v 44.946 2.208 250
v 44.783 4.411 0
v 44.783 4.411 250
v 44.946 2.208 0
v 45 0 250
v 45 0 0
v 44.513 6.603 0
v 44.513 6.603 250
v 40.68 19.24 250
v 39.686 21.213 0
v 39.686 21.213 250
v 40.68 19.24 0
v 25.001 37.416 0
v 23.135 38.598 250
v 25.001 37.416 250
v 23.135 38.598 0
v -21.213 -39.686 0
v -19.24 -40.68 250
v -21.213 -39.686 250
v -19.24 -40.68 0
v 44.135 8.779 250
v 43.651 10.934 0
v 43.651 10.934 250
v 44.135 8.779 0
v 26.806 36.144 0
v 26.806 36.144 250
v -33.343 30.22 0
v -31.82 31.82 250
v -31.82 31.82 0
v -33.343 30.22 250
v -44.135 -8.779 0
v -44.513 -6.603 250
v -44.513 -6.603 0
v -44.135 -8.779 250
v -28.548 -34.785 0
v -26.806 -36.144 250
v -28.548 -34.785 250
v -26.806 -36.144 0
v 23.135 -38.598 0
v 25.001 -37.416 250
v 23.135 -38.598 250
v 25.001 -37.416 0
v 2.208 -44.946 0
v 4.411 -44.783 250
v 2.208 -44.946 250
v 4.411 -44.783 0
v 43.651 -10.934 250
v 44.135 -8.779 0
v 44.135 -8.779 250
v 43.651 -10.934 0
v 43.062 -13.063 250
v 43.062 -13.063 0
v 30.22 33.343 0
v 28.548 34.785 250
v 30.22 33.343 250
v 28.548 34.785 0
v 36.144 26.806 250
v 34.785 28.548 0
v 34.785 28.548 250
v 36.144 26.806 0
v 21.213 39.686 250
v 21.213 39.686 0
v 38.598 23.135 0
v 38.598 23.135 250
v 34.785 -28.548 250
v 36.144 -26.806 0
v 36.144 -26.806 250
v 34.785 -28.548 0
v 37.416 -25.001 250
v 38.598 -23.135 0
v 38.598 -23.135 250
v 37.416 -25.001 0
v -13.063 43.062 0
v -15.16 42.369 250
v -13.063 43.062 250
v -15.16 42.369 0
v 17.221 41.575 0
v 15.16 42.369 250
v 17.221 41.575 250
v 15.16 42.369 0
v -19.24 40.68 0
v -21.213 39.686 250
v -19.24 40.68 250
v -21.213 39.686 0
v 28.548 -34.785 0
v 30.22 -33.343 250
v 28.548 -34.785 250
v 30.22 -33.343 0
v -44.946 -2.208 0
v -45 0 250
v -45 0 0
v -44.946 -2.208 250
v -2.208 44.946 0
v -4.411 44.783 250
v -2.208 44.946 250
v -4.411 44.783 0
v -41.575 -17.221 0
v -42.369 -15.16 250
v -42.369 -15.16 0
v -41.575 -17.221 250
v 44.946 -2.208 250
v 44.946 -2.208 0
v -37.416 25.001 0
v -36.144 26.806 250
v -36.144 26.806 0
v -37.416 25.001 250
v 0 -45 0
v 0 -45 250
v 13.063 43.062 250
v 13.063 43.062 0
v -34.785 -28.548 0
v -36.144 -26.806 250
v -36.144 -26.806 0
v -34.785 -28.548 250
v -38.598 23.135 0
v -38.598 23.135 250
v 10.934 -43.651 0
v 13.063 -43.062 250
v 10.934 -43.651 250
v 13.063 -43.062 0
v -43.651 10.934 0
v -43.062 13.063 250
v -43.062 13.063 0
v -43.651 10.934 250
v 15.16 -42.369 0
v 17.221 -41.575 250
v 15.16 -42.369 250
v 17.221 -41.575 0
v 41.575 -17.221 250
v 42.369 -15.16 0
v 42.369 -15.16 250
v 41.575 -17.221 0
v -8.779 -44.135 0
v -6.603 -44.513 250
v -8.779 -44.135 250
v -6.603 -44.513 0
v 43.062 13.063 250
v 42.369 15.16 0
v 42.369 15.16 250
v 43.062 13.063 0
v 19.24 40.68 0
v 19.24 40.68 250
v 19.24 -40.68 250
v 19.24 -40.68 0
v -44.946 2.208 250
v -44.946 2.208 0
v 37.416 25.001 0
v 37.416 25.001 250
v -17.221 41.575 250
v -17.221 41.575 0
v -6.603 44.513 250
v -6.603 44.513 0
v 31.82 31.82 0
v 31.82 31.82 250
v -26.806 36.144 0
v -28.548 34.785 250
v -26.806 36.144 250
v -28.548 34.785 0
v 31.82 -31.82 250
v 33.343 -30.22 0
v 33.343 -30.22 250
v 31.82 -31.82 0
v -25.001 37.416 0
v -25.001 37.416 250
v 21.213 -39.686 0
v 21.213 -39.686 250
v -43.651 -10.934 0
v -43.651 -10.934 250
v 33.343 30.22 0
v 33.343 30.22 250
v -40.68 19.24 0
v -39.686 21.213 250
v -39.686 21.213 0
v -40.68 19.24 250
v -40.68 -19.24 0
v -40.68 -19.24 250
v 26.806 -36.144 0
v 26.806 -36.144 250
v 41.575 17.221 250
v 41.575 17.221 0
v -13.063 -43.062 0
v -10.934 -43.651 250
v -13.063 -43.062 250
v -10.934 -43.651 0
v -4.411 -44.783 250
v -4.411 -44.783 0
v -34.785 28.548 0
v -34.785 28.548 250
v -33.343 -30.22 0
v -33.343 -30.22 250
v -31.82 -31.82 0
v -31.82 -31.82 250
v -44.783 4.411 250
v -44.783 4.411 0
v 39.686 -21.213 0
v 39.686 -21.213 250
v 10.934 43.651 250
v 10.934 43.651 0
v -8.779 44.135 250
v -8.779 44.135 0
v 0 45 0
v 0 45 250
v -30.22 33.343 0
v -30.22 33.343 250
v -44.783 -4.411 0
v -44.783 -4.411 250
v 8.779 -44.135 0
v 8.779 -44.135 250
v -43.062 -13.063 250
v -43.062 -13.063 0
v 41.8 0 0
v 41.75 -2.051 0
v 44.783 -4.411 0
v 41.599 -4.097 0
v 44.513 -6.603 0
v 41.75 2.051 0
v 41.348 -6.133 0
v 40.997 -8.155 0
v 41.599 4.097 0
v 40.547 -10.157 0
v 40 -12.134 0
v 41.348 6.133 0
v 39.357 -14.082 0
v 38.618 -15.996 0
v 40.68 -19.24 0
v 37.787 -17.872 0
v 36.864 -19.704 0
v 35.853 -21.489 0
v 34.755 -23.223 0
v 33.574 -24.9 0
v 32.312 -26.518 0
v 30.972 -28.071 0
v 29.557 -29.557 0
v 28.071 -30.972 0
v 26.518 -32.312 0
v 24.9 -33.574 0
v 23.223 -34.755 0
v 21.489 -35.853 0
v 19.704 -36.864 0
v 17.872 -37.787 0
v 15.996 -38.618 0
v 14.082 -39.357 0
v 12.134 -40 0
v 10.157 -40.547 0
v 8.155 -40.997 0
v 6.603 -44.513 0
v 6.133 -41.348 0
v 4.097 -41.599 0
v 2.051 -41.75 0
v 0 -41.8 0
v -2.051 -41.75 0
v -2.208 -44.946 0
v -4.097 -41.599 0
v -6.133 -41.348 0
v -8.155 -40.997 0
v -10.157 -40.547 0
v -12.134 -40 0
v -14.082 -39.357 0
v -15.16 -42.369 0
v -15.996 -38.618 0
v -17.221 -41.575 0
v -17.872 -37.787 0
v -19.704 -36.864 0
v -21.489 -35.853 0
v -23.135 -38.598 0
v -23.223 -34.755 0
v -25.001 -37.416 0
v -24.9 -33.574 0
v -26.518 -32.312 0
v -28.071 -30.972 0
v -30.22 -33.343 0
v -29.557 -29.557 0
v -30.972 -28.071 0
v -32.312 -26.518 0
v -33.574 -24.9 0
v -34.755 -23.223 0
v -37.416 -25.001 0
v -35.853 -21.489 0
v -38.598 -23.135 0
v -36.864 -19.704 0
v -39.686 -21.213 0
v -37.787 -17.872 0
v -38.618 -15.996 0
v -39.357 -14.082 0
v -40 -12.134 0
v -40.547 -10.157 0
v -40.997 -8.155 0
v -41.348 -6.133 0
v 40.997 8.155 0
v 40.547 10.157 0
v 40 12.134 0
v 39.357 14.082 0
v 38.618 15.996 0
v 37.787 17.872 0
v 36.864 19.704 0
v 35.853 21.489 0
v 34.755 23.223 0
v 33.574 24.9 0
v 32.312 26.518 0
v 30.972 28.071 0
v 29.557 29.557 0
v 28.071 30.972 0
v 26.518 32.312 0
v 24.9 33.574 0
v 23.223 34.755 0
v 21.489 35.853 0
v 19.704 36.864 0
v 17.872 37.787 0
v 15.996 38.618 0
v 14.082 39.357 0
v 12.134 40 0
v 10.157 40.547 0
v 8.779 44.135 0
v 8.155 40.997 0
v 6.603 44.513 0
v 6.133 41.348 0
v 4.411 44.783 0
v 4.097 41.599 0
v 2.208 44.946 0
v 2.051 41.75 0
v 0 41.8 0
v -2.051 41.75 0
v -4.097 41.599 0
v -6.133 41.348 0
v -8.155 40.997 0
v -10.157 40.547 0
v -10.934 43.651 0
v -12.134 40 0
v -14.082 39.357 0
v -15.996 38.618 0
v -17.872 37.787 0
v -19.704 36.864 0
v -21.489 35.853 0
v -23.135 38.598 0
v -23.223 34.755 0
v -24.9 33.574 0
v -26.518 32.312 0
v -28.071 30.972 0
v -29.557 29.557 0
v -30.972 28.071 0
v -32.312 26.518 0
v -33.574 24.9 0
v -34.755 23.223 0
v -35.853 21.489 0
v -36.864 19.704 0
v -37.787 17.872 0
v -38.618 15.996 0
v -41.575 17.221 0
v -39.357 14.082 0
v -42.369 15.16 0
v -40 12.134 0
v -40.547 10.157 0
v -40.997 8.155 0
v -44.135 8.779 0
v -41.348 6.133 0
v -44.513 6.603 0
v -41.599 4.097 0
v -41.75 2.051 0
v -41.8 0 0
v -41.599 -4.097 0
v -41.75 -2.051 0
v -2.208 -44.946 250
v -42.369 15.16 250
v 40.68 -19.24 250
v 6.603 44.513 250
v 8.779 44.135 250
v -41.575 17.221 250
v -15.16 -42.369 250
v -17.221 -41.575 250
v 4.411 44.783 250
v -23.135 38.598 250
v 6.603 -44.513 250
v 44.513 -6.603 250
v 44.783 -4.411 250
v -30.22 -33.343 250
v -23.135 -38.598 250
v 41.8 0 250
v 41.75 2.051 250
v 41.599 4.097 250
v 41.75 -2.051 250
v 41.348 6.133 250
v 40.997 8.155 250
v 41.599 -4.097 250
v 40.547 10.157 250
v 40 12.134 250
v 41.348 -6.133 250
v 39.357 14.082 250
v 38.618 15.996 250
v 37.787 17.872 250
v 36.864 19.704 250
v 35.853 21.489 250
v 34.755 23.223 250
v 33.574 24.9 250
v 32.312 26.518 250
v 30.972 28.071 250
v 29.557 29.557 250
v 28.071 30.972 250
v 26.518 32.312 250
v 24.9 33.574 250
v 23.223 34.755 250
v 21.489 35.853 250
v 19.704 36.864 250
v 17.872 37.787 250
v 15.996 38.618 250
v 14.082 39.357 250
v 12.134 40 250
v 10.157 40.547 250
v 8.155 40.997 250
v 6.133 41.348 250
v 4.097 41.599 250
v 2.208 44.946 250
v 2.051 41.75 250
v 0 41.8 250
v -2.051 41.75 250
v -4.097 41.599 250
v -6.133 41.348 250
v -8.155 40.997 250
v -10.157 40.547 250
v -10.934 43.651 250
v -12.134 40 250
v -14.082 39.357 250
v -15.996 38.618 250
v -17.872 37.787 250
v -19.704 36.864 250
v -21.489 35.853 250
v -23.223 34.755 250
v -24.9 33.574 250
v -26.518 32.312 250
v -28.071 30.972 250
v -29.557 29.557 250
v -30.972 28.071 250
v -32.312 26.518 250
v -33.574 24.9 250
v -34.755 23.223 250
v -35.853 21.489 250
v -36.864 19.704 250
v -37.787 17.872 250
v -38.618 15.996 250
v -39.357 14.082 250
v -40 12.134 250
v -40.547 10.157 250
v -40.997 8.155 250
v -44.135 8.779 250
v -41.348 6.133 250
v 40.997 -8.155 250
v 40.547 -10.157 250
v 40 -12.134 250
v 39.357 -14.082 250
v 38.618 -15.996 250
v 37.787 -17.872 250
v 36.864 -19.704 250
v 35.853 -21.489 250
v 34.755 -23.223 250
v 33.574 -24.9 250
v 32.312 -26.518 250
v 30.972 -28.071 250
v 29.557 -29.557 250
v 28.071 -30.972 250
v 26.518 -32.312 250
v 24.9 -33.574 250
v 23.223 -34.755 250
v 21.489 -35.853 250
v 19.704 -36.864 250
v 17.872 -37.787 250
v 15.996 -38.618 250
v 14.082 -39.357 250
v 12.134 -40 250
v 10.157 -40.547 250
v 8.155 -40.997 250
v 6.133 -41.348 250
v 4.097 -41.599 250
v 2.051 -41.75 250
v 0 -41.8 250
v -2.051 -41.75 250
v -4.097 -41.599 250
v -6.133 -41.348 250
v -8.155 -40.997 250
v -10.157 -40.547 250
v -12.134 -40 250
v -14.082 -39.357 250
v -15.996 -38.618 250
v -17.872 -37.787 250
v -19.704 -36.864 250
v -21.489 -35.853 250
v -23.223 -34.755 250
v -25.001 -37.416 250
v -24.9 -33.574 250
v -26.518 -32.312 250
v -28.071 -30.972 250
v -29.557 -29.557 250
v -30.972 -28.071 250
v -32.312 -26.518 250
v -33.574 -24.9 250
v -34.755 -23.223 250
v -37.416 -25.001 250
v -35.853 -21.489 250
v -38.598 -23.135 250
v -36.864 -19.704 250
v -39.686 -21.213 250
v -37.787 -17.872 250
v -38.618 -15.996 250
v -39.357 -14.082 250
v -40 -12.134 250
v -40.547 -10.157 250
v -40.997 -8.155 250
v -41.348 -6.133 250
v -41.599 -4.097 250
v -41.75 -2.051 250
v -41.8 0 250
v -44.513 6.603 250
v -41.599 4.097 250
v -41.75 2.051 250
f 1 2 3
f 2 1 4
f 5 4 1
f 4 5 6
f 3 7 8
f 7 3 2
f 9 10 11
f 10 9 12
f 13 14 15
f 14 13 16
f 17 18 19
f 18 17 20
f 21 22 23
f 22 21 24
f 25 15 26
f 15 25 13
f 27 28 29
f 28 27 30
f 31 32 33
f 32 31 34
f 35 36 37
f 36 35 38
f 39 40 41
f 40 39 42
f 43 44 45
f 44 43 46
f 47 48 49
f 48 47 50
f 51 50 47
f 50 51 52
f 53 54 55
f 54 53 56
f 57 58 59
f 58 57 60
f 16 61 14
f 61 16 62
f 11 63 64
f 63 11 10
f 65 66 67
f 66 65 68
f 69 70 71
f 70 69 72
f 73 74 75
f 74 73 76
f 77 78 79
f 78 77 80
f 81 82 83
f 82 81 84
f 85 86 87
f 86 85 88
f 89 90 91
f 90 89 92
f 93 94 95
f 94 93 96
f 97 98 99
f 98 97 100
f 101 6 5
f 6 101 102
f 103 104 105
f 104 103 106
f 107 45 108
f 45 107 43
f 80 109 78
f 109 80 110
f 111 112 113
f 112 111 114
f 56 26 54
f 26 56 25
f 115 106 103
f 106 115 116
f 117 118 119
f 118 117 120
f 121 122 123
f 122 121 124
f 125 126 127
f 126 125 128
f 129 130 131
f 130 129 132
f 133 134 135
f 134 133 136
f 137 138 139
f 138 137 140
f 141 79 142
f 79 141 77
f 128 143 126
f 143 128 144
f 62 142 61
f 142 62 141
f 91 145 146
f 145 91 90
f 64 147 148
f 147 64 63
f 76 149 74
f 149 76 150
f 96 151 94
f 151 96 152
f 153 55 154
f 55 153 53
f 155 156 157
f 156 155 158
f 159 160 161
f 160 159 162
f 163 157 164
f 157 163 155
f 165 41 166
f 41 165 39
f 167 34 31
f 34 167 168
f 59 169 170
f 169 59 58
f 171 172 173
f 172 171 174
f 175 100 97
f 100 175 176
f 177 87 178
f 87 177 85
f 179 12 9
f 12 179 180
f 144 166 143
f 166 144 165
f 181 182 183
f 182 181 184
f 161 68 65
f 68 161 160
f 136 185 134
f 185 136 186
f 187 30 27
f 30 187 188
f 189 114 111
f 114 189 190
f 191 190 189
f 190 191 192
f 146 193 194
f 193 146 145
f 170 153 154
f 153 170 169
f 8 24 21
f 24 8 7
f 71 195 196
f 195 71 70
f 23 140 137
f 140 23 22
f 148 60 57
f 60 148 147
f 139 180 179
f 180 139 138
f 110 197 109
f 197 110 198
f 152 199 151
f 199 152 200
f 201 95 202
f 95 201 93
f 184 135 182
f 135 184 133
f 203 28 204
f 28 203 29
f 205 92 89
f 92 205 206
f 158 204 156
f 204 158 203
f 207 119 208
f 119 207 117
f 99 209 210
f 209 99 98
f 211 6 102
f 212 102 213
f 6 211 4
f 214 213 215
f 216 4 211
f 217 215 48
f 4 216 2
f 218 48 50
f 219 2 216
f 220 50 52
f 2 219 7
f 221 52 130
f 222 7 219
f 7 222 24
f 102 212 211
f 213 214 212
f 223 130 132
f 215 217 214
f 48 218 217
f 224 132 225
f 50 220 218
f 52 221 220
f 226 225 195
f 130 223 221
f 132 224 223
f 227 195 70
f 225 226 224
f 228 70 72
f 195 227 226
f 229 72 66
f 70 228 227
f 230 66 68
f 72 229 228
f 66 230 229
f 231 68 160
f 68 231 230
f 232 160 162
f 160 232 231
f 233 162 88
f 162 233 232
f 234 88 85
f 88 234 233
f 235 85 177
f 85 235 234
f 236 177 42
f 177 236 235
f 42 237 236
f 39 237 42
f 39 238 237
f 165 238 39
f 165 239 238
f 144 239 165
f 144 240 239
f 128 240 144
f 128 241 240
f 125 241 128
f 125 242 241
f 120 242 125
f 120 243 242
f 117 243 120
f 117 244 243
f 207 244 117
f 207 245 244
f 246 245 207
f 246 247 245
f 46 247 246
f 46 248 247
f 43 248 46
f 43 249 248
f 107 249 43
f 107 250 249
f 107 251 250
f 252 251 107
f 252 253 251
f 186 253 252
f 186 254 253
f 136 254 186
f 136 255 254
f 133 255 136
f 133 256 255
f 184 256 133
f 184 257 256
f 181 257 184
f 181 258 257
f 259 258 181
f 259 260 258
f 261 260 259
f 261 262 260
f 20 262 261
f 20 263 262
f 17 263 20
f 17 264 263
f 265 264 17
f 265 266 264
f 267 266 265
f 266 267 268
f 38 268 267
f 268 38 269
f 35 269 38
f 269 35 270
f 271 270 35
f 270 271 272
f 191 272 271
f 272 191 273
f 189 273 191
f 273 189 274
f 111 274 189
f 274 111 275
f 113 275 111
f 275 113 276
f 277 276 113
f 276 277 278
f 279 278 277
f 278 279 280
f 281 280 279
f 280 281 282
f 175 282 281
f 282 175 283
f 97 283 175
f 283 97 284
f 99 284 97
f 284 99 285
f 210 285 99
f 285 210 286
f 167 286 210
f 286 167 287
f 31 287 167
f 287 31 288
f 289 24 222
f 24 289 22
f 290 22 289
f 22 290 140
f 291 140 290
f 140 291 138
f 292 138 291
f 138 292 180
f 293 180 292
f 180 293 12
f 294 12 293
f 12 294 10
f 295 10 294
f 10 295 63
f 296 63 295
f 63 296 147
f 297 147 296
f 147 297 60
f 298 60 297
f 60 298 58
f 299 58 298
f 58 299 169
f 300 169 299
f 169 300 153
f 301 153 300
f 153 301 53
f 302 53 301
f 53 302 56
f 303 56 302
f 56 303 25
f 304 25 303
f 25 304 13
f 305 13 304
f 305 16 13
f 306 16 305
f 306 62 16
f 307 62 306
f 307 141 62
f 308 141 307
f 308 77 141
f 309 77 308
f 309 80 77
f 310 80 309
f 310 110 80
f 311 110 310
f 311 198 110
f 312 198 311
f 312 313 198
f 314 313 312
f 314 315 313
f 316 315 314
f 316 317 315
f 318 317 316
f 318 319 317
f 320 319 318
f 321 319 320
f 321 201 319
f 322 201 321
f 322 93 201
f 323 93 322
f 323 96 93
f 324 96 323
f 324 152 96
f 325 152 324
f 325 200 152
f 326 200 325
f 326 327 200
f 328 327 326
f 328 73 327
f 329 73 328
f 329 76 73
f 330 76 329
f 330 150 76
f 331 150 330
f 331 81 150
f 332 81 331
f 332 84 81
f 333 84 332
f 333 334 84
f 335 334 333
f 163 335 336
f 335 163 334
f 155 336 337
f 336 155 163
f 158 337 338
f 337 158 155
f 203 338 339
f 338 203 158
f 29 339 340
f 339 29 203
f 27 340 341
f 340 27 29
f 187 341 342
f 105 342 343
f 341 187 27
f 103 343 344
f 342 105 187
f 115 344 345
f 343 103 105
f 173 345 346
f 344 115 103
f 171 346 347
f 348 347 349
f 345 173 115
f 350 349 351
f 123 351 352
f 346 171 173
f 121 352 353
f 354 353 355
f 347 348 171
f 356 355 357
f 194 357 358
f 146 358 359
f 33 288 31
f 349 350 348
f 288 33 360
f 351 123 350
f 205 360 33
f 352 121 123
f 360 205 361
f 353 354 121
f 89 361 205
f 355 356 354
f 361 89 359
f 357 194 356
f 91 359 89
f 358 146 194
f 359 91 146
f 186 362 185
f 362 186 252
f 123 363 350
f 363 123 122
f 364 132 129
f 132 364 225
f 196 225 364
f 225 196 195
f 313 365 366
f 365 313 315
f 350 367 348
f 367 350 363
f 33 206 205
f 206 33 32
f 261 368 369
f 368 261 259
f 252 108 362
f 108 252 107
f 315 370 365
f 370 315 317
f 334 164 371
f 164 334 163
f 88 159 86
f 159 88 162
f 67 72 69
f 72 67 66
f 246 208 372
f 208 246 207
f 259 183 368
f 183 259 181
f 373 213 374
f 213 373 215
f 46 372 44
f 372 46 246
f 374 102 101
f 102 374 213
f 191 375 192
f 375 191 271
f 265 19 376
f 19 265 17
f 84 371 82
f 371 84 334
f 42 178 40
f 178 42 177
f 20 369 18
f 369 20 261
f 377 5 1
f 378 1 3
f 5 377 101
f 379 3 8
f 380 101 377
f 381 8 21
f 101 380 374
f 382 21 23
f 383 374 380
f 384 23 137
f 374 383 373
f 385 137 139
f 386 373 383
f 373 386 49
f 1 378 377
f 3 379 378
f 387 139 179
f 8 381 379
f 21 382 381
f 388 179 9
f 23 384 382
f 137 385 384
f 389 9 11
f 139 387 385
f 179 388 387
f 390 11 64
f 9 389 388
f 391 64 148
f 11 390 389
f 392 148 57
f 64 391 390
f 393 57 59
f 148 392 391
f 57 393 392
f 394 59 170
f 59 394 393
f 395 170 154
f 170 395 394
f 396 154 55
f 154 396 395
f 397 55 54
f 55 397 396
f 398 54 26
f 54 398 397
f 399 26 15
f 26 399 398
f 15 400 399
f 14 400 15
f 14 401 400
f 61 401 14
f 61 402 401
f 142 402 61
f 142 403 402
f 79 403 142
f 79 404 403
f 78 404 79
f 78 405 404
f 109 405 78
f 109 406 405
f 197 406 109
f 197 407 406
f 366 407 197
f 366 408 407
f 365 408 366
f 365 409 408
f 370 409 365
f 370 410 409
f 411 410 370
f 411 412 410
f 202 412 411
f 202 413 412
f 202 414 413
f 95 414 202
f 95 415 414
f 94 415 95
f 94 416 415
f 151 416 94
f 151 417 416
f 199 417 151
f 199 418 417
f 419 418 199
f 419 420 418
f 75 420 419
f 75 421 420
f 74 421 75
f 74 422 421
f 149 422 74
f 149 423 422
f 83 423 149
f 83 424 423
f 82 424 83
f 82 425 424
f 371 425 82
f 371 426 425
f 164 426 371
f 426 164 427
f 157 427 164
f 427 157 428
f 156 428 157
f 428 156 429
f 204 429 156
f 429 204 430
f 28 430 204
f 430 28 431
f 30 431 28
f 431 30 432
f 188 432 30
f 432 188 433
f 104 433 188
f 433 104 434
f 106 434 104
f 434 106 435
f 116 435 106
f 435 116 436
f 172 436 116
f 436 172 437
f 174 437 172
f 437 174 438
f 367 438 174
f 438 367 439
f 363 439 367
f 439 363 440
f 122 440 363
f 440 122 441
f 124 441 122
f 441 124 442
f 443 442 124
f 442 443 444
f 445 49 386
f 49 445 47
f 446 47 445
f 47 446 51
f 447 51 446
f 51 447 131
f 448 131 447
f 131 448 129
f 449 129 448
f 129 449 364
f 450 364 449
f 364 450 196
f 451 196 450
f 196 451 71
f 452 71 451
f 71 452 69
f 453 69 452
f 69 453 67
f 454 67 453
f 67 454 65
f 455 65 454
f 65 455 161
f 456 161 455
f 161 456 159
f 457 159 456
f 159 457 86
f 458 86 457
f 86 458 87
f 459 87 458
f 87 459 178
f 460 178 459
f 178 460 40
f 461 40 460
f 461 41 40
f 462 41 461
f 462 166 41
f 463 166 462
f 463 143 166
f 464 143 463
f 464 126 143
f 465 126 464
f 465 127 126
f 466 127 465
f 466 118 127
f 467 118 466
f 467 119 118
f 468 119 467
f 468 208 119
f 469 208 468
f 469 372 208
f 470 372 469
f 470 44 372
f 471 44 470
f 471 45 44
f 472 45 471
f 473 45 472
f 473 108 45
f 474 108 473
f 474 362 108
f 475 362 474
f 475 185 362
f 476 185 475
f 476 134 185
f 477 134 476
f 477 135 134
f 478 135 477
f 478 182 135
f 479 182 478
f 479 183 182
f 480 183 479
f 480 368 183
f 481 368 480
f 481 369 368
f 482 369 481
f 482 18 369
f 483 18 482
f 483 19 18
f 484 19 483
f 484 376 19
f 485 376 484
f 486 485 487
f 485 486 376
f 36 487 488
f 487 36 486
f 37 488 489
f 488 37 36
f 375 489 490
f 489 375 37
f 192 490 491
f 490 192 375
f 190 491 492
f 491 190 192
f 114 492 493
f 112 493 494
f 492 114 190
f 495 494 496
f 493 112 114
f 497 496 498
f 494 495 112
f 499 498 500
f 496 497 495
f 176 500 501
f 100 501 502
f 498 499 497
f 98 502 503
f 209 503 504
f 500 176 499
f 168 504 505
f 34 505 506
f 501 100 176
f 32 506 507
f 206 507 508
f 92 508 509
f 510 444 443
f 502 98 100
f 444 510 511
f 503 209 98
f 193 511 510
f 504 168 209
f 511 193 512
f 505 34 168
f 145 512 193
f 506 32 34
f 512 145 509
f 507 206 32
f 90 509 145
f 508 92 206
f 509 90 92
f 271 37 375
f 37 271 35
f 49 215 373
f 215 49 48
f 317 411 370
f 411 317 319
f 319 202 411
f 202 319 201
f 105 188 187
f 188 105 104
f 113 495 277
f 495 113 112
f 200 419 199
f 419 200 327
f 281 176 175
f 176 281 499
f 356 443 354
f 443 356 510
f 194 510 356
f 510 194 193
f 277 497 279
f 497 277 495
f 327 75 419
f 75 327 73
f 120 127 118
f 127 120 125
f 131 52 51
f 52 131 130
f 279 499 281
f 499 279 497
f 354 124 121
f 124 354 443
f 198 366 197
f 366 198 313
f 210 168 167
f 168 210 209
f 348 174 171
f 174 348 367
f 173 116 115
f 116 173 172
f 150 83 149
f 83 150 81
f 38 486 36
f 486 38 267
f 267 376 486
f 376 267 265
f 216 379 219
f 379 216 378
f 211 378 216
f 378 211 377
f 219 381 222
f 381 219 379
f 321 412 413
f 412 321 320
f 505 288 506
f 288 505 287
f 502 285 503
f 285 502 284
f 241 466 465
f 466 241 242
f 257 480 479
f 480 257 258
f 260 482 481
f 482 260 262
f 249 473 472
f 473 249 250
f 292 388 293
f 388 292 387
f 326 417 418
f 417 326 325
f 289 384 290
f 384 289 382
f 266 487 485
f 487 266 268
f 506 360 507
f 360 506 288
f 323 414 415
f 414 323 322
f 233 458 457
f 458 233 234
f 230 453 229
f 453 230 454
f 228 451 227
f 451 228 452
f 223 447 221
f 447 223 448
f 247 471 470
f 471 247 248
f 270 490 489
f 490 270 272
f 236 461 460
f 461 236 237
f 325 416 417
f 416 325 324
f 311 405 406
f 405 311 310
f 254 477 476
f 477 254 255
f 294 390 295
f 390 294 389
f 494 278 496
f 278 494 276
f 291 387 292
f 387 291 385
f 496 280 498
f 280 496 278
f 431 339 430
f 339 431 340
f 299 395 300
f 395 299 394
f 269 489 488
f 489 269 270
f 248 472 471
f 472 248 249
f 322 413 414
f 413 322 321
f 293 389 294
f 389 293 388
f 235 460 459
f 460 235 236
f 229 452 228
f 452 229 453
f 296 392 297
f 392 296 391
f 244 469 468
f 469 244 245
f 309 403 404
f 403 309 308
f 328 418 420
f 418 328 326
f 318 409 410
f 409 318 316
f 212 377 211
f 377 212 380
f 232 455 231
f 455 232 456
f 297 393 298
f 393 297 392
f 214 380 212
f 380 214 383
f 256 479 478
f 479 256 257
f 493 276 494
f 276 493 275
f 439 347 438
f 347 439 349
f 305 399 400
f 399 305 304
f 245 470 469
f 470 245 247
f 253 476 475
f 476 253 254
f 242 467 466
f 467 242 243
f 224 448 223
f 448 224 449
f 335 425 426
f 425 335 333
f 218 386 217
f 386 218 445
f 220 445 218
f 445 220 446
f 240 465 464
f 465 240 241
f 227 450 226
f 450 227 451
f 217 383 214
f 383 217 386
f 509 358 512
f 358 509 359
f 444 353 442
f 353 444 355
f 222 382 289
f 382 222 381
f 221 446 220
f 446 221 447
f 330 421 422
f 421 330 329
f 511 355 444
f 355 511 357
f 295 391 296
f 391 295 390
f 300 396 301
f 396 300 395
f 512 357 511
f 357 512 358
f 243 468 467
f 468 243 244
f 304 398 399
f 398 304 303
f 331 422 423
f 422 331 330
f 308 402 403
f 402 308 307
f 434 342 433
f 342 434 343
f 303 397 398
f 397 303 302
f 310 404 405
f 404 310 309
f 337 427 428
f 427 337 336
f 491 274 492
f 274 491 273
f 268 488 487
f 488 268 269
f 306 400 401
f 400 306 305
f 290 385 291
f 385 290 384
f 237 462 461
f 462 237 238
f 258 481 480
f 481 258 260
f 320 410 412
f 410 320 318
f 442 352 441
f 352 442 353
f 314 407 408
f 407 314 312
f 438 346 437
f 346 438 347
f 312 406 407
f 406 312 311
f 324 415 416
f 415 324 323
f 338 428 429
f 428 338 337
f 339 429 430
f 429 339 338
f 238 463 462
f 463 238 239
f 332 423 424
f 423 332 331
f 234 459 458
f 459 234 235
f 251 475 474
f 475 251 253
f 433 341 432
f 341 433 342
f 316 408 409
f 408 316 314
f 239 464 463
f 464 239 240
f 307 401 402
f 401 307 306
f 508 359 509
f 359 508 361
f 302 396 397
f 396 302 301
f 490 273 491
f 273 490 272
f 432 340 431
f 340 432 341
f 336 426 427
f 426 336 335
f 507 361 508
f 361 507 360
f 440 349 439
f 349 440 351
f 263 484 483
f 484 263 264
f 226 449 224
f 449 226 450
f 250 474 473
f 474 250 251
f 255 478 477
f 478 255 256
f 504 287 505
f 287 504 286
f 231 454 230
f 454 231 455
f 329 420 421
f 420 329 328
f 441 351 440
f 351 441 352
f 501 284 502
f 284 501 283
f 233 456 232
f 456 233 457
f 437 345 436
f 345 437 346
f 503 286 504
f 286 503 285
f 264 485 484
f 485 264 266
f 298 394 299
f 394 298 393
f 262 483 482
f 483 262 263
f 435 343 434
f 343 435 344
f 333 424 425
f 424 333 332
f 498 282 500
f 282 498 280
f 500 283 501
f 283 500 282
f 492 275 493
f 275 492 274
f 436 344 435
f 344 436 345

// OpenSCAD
$fn = 128;

// HT 90 pipe 250 mm (approximation)
// Assumptions (common HT DN90): OD=90mm, wall=3.2mm, length=250mm
// Adjust parameters as needed.

od = 90;
wall = 3.2;
len = 250;

id = od - 2*wall;

difference() {
  cylinder(h=len, d=od, center=false);
  translate([0,0,-0.5])
    cylinder(h=len+1, d=id, center=false);
}
